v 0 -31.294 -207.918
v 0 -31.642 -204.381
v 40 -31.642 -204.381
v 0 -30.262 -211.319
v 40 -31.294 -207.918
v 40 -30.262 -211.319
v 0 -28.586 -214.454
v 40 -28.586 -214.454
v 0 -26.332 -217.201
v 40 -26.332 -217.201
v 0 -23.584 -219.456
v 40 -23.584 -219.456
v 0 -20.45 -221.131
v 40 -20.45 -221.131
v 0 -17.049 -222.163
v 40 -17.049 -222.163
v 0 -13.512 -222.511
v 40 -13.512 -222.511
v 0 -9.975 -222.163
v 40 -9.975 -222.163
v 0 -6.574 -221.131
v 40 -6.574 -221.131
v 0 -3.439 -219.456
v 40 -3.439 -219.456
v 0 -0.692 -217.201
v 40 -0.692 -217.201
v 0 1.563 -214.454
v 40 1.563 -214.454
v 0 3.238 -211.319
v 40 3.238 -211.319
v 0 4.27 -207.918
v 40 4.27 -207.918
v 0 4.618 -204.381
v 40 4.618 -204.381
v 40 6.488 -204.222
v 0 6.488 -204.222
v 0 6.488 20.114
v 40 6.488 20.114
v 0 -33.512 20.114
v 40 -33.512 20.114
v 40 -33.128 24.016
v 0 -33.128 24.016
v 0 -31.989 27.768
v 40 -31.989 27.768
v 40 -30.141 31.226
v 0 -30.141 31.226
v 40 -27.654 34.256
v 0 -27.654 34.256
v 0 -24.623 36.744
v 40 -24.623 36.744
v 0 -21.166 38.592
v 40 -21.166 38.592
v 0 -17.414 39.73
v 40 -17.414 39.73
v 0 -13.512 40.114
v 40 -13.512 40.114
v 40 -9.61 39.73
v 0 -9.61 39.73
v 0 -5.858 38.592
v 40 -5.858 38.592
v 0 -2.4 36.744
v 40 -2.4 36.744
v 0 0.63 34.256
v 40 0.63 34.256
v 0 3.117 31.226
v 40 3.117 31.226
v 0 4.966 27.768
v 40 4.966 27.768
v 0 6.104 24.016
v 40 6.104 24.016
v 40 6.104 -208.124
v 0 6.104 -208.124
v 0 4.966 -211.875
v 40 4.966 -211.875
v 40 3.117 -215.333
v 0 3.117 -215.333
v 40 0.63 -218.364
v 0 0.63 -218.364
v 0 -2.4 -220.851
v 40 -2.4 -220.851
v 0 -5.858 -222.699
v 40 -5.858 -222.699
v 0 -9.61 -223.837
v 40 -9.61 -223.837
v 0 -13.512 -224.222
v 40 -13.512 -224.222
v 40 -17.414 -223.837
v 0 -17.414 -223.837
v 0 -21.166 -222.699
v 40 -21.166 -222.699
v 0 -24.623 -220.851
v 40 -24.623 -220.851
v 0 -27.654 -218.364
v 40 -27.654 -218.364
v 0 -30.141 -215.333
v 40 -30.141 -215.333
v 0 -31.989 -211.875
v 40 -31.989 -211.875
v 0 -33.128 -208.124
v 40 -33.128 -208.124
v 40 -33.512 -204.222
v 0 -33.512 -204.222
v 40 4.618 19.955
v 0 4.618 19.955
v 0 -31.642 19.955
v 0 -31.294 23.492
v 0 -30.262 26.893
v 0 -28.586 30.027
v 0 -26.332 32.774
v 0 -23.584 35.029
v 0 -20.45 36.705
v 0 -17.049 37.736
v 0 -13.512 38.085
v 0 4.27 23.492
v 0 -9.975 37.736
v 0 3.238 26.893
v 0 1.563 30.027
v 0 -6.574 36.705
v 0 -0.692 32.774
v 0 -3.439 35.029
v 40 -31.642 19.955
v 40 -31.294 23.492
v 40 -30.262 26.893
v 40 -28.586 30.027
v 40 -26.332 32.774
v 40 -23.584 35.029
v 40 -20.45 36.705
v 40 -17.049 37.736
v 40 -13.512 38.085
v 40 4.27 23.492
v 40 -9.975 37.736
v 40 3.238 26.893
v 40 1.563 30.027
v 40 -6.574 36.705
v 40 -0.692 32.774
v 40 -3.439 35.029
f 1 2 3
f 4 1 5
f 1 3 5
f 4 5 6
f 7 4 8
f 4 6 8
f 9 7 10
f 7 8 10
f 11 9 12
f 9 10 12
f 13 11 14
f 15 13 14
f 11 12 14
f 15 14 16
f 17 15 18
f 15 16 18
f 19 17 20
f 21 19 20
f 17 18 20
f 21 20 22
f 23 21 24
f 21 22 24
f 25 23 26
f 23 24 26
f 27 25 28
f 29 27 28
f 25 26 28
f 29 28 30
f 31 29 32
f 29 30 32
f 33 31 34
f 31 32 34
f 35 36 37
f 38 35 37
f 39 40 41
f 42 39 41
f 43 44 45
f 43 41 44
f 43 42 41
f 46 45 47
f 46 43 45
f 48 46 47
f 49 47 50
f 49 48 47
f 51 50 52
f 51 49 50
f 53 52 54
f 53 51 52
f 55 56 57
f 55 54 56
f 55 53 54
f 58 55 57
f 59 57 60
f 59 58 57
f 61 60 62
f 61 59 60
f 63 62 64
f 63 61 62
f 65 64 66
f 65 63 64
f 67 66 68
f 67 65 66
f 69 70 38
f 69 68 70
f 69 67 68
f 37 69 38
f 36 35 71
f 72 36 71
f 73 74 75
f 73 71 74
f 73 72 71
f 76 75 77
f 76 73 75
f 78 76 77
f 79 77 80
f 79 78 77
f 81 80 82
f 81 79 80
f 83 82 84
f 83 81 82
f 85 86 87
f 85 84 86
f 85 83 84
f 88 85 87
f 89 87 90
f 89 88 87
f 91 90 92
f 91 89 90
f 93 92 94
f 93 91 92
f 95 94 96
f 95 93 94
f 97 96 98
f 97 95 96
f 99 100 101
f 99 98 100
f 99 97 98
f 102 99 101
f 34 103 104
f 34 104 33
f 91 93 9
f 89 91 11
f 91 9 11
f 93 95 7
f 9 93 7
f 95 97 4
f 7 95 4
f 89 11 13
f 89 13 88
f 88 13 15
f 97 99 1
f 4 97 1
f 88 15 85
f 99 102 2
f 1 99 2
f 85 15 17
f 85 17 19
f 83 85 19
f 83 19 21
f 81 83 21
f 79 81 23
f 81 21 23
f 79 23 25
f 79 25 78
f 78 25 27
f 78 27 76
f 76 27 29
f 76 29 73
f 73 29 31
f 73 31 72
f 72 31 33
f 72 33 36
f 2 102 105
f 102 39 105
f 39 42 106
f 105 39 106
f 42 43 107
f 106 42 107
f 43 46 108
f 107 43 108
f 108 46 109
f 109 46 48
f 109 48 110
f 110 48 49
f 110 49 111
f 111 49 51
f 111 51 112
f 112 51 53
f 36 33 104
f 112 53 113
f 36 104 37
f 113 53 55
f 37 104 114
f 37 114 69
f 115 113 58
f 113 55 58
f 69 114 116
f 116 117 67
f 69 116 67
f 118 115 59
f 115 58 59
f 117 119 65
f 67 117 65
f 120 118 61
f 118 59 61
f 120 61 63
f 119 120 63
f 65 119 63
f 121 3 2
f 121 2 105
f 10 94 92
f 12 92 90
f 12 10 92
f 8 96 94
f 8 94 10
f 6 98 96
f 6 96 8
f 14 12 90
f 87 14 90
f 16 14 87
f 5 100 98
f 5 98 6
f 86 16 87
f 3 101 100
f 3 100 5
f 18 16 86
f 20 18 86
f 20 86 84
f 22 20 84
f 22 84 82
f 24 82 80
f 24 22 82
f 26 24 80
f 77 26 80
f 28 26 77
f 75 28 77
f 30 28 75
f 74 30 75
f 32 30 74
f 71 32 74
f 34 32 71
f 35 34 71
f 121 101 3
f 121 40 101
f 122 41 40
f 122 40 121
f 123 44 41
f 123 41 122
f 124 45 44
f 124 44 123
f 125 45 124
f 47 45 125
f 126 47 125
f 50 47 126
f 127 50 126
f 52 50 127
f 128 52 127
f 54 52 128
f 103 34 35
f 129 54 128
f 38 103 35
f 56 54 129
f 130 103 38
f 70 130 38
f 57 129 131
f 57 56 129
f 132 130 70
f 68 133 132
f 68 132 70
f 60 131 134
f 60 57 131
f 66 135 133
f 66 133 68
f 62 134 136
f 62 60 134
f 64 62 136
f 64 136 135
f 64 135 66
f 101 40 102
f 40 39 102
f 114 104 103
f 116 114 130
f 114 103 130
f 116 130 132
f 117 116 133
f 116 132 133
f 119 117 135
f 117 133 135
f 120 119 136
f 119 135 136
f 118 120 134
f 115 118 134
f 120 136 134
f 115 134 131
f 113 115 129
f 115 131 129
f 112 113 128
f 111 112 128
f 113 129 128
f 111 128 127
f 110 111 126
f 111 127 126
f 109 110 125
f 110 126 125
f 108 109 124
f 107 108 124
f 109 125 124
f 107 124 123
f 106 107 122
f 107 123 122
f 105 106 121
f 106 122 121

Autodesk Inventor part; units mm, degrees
ref_plane "YZ Plane" through (0, 0, 0) normal (1, 0, 0) x (0, 1, 0)
ref_plane "XZ Plane" through (0, 0, 0) normal (0, 1, 0) x (-1, 0, 0)
ref_plane "XY Plane" through (0, 0, 0) normal (0, 0, 1) x (1, 0, 0)
sketch "スケッチ1" plane through (0, 0, 0) normal (1, 0, 0) x (0, 1, 0)
  line L0 (-33.5119, 20.1143) -> (-33.5119, -204.2217)
  line L1 (6.4881, -204.2217) -> (6.4881, 20.1143)
  arc A0 (6.4881, 20.1143) -> (-33.5119, 20.1143) centre (-13.5119, 20.1143) ccw
  arc A1 (-33.5119, -204.2217) -> (6.4881, -204.2217) centre (-13.5119, -204.2217) ccw
  point P0 (0, 0)
  dimension "d2" = 224.336
  dimension "d3" = 224.336
  dimension "d4" = 40
  dimension "d5" = 40
extrude "押し出し1" add sketch "スケッチ1" along normal blind 40
sketch "スケッチ2" plane through (40, 0, 0) normal (1, 0, 0) x (0, 0, -1)
  line L0 (-19.9546, 4.6181) -> (204.3814, 4.6181)
  line L1 (204.3814, -31.6419) -> (-19.9546, -31.6419)
  line L2 (204.2217, 6.4881) -> (-20.1143, 6.4881) projected
  arc A0 (-19.9546, 4.6181) -> (-19.9546, -31.6419) centre (-19.9546, -13.5119) ccw
  arc A1 (204.3814, -31.6419) -> (204.3814, 4.6181) centre (204.3814, -13.5119) ccw
  point P0 (0, 0)
  dimension "d10" = 1.87
  dimension "d11" = 224.336
  dimension "d12" = 224.336
  dimension "d13" = 36.26
  dimension "d14" = 36.26
  dimension "d15" = 36.26
  dimension "d16" = 36.26
  dimension "d17" = 36.26
extrude "押し出し2" cut sketch "スケッチ2" against normal blind 40
properties part number "nhk11" material "ゴム"
